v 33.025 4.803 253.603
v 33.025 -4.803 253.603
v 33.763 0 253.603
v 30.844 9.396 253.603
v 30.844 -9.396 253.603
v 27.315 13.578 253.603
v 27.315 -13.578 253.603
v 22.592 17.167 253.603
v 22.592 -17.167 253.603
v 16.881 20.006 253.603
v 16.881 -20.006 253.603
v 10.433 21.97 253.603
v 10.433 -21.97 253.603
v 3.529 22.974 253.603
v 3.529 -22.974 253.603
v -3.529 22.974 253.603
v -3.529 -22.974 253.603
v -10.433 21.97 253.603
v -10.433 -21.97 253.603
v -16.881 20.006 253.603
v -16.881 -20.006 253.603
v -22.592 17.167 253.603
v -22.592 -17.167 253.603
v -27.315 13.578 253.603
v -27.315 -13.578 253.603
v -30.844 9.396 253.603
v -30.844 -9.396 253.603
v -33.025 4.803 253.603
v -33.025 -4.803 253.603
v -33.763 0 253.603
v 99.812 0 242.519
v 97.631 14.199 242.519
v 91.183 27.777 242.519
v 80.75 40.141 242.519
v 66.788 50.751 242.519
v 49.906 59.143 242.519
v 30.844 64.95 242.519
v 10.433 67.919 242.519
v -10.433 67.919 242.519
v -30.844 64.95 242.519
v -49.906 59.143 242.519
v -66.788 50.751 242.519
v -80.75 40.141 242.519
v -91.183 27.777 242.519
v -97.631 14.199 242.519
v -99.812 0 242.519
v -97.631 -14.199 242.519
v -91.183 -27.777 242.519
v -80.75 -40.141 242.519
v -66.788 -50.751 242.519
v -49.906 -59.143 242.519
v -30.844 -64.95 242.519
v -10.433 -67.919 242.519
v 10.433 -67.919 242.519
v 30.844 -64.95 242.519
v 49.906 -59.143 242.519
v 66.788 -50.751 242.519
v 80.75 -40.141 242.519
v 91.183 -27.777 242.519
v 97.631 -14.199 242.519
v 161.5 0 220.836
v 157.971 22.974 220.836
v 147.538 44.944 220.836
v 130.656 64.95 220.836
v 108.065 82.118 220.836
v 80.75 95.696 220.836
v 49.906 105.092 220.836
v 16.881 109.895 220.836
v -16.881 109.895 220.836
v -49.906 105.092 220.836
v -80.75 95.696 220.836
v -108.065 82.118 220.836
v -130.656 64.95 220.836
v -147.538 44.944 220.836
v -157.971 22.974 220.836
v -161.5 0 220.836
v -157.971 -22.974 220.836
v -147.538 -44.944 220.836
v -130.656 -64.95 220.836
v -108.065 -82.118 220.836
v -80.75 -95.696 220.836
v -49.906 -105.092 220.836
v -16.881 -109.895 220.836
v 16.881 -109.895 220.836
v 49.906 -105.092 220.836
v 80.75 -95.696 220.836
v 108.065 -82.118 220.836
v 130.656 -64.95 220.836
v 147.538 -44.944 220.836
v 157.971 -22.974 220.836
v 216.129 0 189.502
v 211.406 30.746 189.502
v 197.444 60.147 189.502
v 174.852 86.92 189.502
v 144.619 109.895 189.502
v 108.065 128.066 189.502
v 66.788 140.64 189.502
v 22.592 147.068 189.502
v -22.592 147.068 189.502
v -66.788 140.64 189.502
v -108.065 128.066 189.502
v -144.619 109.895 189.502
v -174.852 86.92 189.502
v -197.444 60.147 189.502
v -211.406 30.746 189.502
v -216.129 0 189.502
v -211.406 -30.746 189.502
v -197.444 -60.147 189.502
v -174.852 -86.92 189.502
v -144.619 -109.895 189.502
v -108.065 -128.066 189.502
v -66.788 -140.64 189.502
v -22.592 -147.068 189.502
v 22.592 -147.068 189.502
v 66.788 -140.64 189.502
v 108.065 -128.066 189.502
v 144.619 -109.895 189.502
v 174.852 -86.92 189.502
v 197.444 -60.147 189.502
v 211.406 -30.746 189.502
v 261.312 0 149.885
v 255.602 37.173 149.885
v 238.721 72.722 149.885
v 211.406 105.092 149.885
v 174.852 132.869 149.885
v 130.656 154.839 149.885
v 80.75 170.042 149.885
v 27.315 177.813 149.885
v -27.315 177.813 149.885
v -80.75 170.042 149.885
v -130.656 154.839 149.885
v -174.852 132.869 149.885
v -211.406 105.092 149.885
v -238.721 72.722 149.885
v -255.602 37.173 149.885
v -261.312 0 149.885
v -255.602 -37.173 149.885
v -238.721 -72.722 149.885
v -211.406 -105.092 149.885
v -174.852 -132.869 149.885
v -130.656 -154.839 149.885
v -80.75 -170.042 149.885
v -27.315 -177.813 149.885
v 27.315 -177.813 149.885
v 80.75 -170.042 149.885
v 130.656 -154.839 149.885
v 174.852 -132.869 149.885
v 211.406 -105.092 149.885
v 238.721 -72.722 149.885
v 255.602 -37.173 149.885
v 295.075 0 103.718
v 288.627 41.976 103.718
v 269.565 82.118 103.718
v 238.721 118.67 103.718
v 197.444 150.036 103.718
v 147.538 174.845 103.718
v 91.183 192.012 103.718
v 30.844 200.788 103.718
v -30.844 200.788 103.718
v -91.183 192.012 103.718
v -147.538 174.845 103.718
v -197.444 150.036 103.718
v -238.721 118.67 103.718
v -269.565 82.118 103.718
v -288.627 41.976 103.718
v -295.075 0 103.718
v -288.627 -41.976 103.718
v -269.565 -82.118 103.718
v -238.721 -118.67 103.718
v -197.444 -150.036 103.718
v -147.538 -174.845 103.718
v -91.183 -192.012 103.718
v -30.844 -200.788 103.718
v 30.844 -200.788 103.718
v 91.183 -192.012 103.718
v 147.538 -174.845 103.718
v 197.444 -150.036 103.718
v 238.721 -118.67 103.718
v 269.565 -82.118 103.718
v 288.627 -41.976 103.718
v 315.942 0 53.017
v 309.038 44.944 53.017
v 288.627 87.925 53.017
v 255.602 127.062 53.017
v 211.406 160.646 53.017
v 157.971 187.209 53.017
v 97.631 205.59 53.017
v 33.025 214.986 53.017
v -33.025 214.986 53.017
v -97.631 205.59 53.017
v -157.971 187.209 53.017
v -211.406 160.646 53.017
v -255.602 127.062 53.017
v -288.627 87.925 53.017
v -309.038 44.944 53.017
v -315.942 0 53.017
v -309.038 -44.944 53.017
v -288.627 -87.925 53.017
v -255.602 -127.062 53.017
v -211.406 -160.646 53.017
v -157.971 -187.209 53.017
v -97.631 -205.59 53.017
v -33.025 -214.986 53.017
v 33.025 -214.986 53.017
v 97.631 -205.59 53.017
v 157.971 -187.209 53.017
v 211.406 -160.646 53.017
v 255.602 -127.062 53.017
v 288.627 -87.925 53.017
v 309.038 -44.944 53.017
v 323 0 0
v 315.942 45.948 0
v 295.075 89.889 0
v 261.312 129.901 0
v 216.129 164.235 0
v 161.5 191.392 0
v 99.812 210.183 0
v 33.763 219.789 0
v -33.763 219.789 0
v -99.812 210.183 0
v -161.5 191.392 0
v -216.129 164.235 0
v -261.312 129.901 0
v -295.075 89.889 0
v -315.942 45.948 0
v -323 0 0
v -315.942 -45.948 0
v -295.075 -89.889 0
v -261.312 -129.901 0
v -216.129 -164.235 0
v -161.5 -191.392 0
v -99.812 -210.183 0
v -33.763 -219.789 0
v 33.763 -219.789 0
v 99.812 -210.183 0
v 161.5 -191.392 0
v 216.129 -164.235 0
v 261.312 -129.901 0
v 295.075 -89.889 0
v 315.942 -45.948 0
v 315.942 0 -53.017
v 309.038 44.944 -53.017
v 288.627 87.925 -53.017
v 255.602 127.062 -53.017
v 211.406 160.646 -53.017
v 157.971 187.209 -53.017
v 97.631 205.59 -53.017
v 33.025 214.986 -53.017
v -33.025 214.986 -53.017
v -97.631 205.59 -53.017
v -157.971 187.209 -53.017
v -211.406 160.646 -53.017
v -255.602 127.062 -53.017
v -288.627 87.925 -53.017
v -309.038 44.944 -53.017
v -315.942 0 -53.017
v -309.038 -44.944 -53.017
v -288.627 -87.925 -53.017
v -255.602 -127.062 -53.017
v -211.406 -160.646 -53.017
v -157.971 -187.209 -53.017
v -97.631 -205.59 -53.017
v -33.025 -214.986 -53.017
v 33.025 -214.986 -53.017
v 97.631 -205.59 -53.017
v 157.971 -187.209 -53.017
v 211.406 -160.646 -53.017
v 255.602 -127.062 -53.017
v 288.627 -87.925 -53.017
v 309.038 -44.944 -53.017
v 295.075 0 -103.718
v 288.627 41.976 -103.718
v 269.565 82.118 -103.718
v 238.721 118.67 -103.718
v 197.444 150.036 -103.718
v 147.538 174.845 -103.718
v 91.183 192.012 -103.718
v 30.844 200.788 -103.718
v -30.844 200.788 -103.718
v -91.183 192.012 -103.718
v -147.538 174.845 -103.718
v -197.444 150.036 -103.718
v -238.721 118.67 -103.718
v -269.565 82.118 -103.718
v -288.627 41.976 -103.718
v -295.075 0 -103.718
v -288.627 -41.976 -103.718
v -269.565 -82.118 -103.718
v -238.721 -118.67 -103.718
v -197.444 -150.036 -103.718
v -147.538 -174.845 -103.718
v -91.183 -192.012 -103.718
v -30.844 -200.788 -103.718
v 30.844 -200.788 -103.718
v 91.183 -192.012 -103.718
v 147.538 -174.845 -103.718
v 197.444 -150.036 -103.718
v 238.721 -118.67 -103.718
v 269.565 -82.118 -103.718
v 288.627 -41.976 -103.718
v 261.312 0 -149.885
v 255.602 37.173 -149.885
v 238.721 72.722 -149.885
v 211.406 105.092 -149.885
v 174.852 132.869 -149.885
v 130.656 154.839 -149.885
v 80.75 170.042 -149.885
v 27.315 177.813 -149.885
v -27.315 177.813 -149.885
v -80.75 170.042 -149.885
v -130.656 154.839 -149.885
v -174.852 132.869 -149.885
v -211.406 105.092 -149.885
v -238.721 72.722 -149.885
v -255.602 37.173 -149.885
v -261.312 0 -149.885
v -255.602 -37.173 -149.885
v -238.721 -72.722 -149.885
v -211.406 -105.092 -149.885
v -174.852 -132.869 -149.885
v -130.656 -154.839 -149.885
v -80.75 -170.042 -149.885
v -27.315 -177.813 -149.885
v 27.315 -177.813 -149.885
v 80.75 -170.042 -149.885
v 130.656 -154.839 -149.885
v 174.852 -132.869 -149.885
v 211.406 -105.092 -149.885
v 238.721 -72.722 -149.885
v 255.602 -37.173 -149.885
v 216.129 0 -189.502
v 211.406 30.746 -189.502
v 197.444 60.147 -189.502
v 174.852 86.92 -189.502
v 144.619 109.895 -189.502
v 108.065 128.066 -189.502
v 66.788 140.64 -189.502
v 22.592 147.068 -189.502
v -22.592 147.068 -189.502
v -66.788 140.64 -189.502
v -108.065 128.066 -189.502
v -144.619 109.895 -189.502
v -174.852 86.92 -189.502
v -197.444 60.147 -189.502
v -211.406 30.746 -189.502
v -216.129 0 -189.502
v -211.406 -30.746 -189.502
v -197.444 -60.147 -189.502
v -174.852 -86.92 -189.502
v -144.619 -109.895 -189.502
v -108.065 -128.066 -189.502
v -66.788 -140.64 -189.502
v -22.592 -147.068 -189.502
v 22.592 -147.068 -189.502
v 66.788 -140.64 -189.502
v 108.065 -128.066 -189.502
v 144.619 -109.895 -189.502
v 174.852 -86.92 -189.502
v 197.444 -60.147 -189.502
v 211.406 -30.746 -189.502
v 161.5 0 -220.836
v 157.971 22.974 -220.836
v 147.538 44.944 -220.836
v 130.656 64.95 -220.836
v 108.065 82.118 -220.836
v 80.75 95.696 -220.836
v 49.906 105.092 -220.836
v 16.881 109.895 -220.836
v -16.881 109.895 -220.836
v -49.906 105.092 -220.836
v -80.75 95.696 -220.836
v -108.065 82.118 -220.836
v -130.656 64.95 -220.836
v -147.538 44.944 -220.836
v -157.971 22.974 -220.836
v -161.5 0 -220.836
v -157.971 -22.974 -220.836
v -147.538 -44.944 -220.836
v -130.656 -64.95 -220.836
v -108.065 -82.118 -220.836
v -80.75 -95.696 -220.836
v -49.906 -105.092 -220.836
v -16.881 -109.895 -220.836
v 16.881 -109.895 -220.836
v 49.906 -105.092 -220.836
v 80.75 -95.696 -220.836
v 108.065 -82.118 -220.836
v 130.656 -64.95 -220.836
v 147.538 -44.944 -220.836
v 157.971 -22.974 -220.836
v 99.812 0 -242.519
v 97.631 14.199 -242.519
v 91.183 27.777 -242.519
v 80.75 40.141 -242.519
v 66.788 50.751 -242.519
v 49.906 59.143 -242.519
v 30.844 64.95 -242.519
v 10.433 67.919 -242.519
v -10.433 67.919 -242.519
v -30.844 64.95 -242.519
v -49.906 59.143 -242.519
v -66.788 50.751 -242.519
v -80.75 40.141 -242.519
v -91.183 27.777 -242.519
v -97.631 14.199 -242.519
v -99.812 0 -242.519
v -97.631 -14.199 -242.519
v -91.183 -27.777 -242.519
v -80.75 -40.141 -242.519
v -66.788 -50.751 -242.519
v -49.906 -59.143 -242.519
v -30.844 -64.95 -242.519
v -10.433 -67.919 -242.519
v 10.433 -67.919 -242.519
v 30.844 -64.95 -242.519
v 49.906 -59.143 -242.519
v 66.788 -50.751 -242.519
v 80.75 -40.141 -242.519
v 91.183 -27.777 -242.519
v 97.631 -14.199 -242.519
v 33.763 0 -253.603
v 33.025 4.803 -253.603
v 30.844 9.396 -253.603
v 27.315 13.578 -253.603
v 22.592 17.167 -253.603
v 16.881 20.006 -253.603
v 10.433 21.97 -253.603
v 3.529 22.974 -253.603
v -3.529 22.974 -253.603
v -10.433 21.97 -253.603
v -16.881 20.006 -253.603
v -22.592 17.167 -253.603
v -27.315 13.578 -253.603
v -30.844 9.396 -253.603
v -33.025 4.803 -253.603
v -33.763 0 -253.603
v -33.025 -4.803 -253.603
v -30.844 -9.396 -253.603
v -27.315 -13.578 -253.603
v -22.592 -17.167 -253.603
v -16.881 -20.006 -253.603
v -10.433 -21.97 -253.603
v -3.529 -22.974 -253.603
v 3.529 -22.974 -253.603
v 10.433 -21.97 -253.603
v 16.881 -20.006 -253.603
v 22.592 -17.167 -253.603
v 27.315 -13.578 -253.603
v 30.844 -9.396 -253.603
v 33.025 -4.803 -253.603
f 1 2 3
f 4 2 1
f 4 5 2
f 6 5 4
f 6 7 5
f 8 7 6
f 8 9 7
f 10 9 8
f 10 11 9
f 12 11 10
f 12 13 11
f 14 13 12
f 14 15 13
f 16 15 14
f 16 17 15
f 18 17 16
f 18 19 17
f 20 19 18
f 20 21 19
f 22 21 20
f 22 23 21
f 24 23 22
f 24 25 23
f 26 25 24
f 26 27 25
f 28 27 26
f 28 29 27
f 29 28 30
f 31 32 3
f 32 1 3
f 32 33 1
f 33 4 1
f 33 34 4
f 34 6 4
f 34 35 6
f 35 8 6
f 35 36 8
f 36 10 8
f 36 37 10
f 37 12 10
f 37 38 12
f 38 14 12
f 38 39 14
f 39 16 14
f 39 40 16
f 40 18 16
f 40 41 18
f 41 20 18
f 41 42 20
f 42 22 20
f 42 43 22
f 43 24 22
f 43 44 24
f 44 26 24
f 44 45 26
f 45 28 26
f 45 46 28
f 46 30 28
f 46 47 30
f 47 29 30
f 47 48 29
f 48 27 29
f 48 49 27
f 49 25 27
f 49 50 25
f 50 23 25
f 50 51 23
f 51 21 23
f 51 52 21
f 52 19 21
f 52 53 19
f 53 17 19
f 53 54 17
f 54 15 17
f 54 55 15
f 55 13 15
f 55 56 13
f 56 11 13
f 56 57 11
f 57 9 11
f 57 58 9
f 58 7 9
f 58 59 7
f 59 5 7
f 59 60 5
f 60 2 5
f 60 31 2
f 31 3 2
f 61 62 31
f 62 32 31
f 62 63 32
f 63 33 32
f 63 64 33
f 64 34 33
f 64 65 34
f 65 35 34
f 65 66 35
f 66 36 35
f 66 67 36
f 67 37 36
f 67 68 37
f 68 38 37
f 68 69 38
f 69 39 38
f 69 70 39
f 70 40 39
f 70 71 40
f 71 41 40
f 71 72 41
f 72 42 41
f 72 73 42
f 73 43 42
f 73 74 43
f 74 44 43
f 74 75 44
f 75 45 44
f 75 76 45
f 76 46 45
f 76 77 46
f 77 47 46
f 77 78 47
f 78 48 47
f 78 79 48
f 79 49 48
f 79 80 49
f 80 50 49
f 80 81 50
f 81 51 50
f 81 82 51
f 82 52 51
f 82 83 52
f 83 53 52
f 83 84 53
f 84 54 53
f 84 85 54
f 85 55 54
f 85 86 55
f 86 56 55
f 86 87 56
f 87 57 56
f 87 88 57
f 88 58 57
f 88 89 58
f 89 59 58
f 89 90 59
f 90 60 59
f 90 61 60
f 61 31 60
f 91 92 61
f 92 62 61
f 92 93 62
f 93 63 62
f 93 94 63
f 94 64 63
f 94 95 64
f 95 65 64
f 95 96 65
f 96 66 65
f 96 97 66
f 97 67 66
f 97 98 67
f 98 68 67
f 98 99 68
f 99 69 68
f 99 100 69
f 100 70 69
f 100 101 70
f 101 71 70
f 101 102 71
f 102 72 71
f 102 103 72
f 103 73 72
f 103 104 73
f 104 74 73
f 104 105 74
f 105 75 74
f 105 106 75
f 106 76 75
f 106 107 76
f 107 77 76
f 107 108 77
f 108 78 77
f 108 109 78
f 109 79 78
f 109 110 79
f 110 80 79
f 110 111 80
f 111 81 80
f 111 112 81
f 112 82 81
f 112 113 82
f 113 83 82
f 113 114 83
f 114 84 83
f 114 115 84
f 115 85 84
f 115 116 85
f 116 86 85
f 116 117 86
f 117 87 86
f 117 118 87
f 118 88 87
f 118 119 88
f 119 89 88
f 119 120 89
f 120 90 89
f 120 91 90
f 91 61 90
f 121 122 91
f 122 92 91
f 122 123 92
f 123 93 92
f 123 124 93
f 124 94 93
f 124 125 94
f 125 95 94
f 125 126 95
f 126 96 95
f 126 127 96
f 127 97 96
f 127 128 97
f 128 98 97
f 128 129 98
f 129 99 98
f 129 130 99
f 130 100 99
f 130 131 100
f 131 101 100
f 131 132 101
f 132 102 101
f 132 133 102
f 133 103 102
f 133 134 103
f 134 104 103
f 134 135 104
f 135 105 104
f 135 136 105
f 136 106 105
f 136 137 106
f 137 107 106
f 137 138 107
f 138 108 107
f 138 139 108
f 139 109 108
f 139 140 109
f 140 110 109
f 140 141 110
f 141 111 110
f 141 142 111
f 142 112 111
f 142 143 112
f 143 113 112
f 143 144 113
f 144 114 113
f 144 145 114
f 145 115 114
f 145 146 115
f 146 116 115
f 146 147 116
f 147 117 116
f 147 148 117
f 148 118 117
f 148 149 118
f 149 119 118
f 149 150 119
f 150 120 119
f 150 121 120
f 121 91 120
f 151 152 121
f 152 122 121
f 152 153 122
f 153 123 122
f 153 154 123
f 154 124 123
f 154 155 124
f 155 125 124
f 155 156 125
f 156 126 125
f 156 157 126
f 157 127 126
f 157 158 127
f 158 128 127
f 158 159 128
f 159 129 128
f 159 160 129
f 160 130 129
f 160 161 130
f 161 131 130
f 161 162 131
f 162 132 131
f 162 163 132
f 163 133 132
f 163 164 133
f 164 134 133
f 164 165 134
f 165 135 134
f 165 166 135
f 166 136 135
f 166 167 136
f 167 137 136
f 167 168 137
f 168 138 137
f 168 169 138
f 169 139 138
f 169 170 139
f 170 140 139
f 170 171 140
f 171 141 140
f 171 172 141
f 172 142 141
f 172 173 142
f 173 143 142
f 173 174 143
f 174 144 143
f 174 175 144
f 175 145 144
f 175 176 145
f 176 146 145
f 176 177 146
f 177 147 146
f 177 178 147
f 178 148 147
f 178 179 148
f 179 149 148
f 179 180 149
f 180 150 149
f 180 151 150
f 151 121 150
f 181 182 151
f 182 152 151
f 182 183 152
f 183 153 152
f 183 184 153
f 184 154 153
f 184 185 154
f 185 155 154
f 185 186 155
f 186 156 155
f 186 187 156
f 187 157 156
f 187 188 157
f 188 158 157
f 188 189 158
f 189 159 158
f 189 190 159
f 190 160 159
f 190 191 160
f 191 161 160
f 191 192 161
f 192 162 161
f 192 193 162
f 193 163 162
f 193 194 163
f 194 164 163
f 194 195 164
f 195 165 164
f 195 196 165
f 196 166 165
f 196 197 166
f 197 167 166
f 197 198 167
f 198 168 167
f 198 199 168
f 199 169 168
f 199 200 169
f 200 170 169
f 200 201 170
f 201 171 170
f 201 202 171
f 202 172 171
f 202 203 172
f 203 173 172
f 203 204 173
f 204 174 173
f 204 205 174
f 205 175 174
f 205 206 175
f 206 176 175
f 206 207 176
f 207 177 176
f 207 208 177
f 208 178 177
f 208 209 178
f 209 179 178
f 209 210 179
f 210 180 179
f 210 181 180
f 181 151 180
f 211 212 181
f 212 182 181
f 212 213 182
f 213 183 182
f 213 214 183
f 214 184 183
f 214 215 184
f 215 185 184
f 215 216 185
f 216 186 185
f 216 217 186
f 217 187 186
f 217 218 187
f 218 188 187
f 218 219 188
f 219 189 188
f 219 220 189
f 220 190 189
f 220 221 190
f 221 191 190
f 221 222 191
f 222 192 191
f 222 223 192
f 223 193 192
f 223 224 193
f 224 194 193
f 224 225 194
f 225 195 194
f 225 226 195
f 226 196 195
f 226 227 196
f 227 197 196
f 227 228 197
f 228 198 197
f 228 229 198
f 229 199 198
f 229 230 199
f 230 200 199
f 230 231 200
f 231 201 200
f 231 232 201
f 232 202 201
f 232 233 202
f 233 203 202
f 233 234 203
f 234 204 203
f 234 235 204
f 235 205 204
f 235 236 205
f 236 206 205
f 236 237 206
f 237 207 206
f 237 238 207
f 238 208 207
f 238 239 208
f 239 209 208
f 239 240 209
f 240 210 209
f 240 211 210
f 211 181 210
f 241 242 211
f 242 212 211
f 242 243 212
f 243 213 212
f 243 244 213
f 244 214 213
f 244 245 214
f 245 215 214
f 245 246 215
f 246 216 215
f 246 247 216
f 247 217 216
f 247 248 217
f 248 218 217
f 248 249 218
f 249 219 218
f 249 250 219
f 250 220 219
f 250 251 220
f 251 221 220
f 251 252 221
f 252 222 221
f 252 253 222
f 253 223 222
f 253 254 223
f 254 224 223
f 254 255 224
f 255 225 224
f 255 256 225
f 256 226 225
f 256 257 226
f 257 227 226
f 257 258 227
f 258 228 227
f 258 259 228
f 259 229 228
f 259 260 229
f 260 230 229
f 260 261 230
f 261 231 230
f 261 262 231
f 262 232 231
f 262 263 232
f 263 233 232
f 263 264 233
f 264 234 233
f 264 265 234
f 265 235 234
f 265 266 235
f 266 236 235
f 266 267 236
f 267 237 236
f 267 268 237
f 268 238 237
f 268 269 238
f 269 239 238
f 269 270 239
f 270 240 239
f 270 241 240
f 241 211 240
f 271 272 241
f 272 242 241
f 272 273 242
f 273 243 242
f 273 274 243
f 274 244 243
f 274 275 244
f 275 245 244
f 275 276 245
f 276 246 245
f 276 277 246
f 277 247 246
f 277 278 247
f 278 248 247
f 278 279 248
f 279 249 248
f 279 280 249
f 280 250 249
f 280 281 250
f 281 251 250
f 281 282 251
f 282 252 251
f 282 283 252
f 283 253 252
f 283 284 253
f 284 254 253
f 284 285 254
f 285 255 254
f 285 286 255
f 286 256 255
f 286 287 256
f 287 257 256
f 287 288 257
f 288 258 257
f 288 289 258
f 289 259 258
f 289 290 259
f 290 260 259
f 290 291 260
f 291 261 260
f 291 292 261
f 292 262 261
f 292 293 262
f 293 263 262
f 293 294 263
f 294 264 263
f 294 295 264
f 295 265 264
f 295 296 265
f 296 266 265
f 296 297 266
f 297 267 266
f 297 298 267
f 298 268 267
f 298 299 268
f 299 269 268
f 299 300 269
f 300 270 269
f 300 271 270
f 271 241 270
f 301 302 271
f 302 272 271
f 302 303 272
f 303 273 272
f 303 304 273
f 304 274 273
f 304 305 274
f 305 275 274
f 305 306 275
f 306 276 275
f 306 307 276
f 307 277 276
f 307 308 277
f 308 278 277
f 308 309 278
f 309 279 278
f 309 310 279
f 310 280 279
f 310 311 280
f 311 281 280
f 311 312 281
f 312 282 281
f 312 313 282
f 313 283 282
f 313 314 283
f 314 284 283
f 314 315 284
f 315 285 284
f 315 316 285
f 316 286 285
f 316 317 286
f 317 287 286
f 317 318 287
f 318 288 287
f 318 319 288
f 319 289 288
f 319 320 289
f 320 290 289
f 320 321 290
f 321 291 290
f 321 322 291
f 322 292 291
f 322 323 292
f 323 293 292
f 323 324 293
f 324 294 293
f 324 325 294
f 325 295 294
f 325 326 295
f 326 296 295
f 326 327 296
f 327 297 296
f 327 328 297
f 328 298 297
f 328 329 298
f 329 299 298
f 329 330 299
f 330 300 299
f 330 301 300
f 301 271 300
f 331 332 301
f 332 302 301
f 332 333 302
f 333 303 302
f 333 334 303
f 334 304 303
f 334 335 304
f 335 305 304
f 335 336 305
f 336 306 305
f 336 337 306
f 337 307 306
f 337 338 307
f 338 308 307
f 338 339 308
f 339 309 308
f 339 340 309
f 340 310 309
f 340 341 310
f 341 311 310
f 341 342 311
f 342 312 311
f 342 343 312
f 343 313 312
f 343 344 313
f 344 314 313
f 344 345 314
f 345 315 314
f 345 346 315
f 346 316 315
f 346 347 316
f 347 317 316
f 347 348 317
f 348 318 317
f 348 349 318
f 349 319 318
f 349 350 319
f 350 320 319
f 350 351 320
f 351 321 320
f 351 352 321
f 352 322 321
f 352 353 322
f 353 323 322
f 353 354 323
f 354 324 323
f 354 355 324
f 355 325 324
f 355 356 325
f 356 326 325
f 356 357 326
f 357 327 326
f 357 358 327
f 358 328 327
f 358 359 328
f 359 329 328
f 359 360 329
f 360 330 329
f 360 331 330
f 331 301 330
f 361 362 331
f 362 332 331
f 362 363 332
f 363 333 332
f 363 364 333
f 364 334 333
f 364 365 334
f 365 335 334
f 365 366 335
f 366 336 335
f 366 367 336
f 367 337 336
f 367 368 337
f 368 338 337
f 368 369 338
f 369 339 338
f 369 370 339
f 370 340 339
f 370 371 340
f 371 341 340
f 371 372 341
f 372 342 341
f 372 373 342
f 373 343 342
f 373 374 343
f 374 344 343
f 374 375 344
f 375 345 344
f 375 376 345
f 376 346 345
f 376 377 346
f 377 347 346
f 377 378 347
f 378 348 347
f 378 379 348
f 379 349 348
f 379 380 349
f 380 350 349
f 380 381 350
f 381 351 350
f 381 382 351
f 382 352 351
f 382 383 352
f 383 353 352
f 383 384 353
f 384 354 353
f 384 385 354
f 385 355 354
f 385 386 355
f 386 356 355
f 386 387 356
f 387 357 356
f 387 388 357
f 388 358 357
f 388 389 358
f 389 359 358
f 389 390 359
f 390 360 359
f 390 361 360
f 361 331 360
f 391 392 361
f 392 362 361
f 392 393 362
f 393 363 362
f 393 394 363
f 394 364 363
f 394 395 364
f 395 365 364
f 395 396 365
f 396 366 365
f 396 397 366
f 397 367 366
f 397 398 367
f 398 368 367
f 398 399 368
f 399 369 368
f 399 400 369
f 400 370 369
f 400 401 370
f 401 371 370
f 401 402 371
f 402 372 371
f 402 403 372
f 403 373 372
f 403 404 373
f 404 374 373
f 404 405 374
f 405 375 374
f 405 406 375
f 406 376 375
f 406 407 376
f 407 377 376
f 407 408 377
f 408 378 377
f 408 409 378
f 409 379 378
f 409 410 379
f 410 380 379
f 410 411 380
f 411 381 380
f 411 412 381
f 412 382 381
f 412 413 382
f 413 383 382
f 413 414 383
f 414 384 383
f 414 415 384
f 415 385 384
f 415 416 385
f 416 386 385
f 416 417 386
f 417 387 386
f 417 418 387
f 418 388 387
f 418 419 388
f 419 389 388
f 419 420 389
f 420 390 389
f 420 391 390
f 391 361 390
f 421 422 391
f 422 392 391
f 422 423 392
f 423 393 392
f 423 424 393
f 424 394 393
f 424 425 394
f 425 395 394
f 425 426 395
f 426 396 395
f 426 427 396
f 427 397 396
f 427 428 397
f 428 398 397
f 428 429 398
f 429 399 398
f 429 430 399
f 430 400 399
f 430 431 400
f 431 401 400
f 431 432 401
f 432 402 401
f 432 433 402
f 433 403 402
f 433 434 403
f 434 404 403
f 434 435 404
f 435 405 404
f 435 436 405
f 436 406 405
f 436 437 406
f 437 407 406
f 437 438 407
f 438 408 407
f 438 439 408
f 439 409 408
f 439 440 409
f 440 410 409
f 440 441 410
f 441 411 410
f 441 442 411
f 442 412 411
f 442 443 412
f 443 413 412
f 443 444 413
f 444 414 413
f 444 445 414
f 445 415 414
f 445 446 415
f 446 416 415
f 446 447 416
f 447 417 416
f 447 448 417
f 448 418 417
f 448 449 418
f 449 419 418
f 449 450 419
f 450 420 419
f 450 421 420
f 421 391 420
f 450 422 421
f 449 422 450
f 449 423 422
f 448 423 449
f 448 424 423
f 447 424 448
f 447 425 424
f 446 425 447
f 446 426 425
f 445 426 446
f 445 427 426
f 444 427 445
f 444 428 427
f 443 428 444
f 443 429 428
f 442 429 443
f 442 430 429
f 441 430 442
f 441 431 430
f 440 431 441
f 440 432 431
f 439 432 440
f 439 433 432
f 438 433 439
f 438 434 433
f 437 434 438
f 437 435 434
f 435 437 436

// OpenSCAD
// Generated by SolidPython 1.0.1 on 2020-07-29 00:46:54


scale(v = [19, 13, 15]) {
	sphere(r = 17);
}
/***********************************************
*********      SolidPython code:      **********
************************************************
 
# import packages: SolidPython
from solid import *
from solid.utils import *
from itertools import chain, combinations, permutations


class Resize:

    def __init__(self, scad_file):
        self.scad_file = scad_file
        #self.scad_file = import_scad(scad_file)
        # cone/cylinder param:
        self.r1 = 0
        self.r2 = 0
        self.h = 0
        # rectangular prism param:
        self.w = 0
        self.l = 0
        # ellipse param:
        self.r = 0

    # import OpenScad code (file name corresponds to shape)


    # classify shape + parameters
    def assign(self, param1, param2, param3):
        if self.scad_file == 'cone.scad':
            self.r1 = param1
            self.r2 = param2
            self.h = param3
        elif self.scad_file == 'cylinder.scad':
            self.r1 = param1
            self.r2 = param2
            self.h = param3
        elif self.scad_file == 'rectangularPrism.scad':
            self.h = param1
            self.l = param2
            self.w = param3
        else:
            self.r = param1
            self.h = param2

    # resize parameters
    def iterate(self):
        x = range(3, 20, 2)
        i = 1
        if self.scad_file == 'cone.scad':
            tempList = list(permutations(x, 2))
            for temp in tempList:
                param1 = temp[0]
                param2 = temp[1]
                filepath = 'produced_scad_files/' + 'cone' + str(param1) + '_' + str(param2) + '_' + '.scad'
                scad_render_to_file(cylinder(h=param1, r1=param2, r2=0), filepath)

        elif self.scad_file == 'cylinder.scad':
            tempList = list(permutations(x, 3))
            for temp in tempList:
                param1 = temp[0]
                param2 = temp[1]
                filepath = 'produced_scad_files/' + 'cylinder' + str(param1) + '_' + str(param2) + '_' + '.scad'
                scad_render_to_file(cylinder(h=param1, r1=param2, r2=param2), filepath)

        elif self.scad_file == 'rectangularPrism.scad':
            tempList = list(permutations(x, 3))
            for temp in tempList:
                param1 = temp[0]
                param2 = temp[1]
                param3 = temp[2]
                filepath = 'produced_scad_files/' + 'rectangularPrism' + str(param1) + '_' + str(param2) + '_' + str(
                    param3) + '.scad'
                scad_render_to_file(cube(size=(param1, param2, param3)), filepath)

        elif self.scad_file == 'ellipse.scad':
            tempList = list(permutations(x, 4))
            for temp in tempList:
                param1 = temp[0]
                param2 = temp[1]
                param3 = temp[2]
                param4 = temp[3]
                filepath = 'produced_scad_files/' + 'ellipse' + str(param1) + '_' + str(param2) + '_' + str(param3) + '_' + str(param4) + '.scad'
                scad_render_to_file(scale([param1, param2, param3])(sphere(r=param4)), filepath)

    def render_to_scadfile(self):
        scad_render_to_file(scad, 'example.scad') 
 
************************************************/
